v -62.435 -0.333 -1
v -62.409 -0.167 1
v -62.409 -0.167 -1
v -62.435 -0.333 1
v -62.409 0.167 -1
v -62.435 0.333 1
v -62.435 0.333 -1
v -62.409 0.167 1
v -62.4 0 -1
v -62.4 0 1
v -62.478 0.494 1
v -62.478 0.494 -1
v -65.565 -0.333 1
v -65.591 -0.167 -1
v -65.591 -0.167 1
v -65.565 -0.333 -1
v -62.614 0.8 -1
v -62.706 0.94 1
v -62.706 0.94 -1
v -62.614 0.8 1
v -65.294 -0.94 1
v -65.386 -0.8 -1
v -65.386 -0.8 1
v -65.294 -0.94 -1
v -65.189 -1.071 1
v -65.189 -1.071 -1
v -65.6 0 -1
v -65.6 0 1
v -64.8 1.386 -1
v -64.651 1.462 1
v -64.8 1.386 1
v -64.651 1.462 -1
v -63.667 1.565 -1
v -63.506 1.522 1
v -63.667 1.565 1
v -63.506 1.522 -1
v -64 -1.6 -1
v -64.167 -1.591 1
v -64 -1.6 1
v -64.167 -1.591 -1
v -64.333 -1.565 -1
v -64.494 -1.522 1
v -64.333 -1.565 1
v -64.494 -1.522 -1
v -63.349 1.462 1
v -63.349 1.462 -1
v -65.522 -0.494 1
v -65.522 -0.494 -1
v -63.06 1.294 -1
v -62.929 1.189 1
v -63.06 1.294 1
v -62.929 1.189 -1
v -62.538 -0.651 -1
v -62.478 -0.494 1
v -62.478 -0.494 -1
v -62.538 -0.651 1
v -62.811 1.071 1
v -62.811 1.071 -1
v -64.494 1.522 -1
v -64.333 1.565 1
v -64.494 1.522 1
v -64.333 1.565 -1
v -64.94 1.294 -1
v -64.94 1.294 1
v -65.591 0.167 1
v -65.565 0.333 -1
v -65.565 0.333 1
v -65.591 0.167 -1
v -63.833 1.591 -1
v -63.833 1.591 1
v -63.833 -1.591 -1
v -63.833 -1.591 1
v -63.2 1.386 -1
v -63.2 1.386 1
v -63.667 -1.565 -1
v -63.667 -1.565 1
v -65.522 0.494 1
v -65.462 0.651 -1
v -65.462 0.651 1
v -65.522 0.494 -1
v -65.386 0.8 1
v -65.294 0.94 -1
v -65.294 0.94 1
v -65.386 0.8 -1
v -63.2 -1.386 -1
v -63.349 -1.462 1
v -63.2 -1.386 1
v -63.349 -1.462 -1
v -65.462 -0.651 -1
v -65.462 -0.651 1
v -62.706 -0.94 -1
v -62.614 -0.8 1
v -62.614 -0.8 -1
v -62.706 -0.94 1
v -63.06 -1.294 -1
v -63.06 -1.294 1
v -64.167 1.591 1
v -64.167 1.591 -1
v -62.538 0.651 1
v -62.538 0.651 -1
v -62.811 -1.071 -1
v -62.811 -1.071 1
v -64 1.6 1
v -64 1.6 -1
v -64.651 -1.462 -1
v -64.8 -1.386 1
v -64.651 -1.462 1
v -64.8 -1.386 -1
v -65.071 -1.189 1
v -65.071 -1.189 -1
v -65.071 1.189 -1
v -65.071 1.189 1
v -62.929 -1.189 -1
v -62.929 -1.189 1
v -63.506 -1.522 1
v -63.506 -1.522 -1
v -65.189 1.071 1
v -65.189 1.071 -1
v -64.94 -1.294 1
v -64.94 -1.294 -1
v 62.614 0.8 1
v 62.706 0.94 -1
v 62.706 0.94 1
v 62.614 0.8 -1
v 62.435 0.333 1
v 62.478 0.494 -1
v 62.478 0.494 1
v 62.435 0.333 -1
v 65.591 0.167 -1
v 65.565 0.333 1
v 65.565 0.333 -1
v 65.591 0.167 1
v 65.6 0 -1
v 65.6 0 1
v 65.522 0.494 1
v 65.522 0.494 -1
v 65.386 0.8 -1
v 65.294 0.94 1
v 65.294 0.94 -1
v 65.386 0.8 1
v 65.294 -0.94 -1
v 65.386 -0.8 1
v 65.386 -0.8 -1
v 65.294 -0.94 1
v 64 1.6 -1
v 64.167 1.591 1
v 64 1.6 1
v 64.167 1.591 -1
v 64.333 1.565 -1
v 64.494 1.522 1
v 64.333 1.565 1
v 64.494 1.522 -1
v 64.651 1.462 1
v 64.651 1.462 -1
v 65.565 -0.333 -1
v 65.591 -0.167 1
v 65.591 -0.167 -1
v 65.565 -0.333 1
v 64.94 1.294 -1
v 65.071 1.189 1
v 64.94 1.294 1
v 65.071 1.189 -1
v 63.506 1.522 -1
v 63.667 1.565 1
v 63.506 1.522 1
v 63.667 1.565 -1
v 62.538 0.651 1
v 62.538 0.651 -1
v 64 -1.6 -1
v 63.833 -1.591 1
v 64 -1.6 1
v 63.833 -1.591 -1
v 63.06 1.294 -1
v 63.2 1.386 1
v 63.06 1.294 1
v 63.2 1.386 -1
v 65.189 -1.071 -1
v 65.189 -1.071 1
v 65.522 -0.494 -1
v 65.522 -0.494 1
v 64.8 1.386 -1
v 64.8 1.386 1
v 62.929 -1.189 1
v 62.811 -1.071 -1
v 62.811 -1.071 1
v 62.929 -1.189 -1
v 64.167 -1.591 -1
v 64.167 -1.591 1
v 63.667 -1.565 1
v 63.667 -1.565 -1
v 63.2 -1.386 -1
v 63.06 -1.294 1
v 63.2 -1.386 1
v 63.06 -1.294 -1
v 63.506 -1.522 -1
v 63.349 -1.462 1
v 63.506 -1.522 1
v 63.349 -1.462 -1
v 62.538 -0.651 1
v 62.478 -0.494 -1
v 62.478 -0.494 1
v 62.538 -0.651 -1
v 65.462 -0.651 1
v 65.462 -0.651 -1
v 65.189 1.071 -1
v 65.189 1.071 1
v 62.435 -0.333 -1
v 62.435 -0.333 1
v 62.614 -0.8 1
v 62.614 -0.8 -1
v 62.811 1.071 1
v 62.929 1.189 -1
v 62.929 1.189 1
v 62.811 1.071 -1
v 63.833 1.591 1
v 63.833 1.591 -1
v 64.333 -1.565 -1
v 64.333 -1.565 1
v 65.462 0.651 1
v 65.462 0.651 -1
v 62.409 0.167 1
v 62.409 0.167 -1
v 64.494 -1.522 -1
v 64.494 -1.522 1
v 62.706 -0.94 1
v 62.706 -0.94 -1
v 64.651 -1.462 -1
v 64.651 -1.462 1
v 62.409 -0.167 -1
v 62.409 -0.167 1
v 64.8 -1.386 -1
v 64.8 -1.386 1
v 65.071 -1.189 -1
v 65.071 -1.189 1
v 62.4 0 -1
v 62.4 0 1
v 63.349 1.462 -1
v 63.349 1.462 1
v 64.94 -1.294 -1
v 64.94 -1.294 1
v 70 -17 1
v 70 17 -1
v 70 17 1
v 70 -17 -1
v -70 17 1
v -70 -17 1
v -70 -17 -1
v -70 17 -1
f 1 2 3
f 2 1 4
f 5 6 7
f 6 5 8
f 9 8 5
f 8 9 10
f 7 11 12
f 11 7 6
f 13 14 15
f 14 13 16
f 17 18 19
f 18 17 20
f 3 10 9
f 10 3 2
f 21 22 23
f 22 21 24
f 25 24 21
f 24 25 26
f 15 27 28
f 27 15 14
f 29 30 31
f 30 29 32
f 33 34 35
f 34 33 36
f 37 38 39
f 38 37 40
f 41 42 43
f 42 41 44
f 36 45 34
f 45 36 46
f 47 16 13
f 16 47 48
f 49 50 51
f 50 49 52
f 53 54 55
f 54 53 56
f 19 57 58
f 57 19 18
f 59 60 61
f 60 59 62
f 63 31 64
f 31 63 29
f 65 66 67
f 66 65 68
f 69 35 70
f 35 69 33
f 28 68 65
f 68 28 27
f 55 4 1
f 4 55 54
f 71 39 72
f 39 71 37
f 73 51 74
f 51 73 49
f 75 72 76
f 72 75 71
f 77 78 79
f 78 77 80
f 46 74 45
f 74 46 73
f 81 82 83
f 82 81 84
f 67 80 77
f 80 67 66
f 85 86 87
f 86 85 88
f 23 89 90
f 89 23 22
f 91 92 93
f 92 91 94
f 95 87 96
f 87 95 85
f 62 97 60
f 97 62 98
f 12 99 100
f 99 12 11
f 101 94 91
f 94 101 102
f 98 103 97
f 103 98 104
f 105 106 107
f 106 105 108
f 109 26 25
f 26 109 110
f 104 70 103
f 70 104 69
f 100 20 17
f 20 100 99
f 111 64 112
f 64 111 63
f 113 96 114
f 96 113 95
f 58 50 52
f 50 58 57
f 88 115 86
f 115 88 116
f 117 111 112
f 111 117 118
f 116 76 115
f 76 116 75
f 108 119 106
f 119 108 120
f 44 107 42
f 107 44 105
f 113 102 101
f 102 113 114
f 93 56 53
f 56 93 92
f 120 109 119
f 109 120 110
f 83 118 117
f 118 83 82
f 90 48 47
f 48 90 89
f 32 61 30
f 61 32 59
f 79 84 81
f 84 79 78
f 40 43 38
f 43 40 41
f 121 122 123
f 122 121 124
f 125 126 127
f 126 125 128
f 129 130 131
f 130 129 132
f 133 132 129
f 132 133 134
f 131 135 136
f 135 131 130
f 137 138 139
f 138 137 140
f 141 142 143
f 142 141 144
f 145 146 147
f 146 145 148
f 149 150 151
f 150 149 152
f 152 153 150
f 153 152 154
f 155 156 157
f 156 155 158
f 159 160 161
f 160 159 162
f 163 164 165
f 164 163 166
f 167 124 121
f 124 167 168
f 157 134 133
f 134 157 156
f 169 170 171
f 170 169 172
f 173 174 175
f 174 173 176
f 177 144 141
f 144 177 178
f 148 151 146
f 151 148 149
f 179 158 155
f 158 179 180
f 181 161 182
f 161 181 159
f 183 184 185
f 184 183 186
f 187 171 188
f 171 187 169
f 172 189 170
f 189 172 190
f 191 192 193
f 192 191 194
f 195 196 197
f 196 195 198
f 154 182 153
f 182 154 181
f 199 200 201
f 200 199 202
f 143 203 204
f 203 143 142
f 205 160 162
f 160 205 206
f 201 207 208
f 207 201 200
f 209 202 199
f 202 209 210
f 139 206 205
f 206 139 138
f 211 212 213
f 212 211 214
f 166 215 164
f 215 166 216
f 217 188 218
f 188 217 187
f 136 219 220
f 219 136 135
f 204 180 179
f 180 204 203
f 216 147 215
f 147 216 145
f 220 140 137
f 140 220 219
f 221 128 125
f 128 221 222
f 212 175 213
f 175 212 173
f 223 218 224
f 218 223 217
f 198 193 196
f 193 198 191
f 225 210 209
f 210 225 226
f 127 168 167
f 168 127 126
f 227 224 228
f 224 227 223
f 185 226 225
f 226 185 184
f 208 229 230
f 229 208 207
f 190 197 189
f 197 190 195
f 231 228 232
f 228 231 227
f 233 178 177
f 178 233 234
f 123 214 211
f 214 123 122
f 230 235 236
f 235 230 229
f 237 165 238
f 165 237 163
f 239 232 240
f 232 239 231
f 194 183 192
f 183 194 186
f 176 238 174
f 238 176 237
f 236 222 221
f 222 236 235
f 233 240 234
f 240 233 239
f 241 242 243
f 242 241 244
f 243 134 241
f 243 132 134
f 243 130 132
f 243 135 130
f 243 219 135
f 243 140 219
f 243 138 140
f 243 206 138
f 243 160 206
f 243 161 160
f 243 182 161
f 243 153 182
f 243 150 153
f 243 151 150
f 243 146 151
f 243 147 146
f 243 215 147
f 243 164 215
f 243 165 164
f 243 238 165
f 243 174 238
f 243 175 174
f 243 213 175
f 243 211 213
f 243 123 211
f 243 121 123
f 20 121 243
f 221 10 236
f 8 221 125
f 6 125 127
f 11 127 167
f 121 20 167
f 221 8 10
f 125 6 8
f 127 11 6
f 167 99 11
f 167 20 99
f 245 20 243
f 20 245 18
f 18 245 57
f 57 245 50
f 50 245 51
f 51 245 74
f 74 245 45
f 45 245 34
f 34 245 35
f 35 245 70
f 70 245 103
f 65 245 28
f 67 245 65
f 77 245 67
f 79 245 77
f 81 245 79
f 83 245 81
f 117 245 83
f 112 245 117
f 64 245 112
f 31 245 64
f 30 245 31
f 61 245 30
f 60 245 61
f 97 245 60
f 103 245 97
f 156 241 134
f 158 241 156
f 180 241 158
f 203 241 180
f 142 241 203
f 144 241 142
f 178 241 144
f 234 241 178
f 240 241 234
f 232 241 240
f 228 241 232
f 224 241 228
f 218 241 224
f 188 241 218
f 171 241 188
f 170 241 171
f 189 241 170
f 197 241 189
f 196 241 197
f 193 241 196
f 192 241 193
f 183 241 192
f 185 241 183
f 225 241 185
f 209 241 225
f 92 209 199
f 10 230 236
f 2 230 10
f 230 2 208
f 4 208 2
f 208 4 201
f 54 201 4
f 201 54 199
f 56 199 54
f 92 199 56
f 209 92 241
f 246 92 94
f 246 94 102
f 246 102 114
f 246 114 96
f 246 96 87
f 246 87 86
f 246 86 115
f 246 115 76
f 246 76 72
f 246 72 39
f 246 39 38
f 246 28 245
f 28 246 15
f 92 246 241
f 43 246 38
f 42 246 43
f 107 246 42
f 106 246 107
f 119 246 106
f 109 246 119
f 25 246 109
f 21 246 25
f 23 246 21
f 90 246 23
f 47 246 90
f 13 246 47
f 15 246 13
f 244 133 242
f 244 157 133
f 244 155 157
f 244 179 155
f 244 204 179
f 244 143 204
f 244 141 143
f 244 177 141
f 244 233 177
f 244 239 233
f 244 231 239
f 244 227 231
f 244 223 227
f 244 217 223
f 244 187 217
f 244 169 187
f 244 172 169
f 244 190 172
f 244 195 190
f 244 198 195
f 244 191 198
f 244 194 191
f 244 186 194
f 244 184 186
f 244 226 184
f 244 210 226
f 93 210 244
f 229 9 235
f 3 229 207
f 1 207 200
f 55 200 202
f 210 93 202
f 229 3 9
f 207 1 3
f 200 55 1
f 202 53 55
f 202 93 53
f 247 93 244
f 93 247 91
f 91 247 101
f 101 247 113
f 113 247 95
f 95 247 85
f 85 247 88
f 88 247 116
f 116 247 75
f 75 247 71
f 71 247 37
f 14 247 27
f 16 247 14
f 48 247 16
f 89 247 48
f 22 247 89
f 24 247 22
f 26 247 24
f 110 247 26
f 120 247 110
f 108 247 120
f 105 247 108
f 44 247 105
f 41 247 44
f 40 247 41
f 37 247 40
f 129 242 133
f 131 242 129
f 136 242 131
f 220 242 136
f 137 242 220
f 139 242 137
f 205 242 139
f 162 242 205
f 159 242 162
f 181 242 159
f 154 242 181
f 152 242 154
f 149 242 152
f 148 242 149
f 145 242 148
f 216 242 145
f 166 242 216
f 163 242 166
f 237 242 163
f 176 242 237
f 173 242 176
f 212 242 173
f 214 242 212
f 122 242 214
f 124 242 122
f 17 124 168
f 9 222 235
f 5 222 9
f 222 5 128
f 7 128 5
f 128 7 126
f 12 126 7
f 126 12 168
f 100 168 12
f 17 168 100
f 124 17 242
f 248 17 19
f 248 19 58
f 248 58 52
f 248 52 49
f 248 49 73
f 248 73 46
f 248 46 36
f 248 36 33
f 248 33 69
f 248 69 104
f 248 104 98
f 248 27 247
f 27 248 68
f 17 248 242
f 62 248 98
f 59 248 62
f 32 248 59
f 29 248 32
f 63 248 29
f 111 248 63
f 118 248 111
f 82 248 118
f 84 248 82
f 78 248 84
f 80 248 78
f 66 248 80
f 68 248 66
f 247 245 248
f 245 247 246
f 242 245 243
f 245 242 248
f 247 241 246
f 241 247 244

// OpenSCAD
// Engraving-ready nameplate.
$fn = 60;
eps = 0.02;
length = 140;
width = 34;
thickness = 2;
difference() { cube([length,width,thickness],center=true); for(x=[-length/2+6,length/2-6]) translate([x,0,-thickness/2-eps]) cylinder(d=3.2,h=thickness+2*eps); }
